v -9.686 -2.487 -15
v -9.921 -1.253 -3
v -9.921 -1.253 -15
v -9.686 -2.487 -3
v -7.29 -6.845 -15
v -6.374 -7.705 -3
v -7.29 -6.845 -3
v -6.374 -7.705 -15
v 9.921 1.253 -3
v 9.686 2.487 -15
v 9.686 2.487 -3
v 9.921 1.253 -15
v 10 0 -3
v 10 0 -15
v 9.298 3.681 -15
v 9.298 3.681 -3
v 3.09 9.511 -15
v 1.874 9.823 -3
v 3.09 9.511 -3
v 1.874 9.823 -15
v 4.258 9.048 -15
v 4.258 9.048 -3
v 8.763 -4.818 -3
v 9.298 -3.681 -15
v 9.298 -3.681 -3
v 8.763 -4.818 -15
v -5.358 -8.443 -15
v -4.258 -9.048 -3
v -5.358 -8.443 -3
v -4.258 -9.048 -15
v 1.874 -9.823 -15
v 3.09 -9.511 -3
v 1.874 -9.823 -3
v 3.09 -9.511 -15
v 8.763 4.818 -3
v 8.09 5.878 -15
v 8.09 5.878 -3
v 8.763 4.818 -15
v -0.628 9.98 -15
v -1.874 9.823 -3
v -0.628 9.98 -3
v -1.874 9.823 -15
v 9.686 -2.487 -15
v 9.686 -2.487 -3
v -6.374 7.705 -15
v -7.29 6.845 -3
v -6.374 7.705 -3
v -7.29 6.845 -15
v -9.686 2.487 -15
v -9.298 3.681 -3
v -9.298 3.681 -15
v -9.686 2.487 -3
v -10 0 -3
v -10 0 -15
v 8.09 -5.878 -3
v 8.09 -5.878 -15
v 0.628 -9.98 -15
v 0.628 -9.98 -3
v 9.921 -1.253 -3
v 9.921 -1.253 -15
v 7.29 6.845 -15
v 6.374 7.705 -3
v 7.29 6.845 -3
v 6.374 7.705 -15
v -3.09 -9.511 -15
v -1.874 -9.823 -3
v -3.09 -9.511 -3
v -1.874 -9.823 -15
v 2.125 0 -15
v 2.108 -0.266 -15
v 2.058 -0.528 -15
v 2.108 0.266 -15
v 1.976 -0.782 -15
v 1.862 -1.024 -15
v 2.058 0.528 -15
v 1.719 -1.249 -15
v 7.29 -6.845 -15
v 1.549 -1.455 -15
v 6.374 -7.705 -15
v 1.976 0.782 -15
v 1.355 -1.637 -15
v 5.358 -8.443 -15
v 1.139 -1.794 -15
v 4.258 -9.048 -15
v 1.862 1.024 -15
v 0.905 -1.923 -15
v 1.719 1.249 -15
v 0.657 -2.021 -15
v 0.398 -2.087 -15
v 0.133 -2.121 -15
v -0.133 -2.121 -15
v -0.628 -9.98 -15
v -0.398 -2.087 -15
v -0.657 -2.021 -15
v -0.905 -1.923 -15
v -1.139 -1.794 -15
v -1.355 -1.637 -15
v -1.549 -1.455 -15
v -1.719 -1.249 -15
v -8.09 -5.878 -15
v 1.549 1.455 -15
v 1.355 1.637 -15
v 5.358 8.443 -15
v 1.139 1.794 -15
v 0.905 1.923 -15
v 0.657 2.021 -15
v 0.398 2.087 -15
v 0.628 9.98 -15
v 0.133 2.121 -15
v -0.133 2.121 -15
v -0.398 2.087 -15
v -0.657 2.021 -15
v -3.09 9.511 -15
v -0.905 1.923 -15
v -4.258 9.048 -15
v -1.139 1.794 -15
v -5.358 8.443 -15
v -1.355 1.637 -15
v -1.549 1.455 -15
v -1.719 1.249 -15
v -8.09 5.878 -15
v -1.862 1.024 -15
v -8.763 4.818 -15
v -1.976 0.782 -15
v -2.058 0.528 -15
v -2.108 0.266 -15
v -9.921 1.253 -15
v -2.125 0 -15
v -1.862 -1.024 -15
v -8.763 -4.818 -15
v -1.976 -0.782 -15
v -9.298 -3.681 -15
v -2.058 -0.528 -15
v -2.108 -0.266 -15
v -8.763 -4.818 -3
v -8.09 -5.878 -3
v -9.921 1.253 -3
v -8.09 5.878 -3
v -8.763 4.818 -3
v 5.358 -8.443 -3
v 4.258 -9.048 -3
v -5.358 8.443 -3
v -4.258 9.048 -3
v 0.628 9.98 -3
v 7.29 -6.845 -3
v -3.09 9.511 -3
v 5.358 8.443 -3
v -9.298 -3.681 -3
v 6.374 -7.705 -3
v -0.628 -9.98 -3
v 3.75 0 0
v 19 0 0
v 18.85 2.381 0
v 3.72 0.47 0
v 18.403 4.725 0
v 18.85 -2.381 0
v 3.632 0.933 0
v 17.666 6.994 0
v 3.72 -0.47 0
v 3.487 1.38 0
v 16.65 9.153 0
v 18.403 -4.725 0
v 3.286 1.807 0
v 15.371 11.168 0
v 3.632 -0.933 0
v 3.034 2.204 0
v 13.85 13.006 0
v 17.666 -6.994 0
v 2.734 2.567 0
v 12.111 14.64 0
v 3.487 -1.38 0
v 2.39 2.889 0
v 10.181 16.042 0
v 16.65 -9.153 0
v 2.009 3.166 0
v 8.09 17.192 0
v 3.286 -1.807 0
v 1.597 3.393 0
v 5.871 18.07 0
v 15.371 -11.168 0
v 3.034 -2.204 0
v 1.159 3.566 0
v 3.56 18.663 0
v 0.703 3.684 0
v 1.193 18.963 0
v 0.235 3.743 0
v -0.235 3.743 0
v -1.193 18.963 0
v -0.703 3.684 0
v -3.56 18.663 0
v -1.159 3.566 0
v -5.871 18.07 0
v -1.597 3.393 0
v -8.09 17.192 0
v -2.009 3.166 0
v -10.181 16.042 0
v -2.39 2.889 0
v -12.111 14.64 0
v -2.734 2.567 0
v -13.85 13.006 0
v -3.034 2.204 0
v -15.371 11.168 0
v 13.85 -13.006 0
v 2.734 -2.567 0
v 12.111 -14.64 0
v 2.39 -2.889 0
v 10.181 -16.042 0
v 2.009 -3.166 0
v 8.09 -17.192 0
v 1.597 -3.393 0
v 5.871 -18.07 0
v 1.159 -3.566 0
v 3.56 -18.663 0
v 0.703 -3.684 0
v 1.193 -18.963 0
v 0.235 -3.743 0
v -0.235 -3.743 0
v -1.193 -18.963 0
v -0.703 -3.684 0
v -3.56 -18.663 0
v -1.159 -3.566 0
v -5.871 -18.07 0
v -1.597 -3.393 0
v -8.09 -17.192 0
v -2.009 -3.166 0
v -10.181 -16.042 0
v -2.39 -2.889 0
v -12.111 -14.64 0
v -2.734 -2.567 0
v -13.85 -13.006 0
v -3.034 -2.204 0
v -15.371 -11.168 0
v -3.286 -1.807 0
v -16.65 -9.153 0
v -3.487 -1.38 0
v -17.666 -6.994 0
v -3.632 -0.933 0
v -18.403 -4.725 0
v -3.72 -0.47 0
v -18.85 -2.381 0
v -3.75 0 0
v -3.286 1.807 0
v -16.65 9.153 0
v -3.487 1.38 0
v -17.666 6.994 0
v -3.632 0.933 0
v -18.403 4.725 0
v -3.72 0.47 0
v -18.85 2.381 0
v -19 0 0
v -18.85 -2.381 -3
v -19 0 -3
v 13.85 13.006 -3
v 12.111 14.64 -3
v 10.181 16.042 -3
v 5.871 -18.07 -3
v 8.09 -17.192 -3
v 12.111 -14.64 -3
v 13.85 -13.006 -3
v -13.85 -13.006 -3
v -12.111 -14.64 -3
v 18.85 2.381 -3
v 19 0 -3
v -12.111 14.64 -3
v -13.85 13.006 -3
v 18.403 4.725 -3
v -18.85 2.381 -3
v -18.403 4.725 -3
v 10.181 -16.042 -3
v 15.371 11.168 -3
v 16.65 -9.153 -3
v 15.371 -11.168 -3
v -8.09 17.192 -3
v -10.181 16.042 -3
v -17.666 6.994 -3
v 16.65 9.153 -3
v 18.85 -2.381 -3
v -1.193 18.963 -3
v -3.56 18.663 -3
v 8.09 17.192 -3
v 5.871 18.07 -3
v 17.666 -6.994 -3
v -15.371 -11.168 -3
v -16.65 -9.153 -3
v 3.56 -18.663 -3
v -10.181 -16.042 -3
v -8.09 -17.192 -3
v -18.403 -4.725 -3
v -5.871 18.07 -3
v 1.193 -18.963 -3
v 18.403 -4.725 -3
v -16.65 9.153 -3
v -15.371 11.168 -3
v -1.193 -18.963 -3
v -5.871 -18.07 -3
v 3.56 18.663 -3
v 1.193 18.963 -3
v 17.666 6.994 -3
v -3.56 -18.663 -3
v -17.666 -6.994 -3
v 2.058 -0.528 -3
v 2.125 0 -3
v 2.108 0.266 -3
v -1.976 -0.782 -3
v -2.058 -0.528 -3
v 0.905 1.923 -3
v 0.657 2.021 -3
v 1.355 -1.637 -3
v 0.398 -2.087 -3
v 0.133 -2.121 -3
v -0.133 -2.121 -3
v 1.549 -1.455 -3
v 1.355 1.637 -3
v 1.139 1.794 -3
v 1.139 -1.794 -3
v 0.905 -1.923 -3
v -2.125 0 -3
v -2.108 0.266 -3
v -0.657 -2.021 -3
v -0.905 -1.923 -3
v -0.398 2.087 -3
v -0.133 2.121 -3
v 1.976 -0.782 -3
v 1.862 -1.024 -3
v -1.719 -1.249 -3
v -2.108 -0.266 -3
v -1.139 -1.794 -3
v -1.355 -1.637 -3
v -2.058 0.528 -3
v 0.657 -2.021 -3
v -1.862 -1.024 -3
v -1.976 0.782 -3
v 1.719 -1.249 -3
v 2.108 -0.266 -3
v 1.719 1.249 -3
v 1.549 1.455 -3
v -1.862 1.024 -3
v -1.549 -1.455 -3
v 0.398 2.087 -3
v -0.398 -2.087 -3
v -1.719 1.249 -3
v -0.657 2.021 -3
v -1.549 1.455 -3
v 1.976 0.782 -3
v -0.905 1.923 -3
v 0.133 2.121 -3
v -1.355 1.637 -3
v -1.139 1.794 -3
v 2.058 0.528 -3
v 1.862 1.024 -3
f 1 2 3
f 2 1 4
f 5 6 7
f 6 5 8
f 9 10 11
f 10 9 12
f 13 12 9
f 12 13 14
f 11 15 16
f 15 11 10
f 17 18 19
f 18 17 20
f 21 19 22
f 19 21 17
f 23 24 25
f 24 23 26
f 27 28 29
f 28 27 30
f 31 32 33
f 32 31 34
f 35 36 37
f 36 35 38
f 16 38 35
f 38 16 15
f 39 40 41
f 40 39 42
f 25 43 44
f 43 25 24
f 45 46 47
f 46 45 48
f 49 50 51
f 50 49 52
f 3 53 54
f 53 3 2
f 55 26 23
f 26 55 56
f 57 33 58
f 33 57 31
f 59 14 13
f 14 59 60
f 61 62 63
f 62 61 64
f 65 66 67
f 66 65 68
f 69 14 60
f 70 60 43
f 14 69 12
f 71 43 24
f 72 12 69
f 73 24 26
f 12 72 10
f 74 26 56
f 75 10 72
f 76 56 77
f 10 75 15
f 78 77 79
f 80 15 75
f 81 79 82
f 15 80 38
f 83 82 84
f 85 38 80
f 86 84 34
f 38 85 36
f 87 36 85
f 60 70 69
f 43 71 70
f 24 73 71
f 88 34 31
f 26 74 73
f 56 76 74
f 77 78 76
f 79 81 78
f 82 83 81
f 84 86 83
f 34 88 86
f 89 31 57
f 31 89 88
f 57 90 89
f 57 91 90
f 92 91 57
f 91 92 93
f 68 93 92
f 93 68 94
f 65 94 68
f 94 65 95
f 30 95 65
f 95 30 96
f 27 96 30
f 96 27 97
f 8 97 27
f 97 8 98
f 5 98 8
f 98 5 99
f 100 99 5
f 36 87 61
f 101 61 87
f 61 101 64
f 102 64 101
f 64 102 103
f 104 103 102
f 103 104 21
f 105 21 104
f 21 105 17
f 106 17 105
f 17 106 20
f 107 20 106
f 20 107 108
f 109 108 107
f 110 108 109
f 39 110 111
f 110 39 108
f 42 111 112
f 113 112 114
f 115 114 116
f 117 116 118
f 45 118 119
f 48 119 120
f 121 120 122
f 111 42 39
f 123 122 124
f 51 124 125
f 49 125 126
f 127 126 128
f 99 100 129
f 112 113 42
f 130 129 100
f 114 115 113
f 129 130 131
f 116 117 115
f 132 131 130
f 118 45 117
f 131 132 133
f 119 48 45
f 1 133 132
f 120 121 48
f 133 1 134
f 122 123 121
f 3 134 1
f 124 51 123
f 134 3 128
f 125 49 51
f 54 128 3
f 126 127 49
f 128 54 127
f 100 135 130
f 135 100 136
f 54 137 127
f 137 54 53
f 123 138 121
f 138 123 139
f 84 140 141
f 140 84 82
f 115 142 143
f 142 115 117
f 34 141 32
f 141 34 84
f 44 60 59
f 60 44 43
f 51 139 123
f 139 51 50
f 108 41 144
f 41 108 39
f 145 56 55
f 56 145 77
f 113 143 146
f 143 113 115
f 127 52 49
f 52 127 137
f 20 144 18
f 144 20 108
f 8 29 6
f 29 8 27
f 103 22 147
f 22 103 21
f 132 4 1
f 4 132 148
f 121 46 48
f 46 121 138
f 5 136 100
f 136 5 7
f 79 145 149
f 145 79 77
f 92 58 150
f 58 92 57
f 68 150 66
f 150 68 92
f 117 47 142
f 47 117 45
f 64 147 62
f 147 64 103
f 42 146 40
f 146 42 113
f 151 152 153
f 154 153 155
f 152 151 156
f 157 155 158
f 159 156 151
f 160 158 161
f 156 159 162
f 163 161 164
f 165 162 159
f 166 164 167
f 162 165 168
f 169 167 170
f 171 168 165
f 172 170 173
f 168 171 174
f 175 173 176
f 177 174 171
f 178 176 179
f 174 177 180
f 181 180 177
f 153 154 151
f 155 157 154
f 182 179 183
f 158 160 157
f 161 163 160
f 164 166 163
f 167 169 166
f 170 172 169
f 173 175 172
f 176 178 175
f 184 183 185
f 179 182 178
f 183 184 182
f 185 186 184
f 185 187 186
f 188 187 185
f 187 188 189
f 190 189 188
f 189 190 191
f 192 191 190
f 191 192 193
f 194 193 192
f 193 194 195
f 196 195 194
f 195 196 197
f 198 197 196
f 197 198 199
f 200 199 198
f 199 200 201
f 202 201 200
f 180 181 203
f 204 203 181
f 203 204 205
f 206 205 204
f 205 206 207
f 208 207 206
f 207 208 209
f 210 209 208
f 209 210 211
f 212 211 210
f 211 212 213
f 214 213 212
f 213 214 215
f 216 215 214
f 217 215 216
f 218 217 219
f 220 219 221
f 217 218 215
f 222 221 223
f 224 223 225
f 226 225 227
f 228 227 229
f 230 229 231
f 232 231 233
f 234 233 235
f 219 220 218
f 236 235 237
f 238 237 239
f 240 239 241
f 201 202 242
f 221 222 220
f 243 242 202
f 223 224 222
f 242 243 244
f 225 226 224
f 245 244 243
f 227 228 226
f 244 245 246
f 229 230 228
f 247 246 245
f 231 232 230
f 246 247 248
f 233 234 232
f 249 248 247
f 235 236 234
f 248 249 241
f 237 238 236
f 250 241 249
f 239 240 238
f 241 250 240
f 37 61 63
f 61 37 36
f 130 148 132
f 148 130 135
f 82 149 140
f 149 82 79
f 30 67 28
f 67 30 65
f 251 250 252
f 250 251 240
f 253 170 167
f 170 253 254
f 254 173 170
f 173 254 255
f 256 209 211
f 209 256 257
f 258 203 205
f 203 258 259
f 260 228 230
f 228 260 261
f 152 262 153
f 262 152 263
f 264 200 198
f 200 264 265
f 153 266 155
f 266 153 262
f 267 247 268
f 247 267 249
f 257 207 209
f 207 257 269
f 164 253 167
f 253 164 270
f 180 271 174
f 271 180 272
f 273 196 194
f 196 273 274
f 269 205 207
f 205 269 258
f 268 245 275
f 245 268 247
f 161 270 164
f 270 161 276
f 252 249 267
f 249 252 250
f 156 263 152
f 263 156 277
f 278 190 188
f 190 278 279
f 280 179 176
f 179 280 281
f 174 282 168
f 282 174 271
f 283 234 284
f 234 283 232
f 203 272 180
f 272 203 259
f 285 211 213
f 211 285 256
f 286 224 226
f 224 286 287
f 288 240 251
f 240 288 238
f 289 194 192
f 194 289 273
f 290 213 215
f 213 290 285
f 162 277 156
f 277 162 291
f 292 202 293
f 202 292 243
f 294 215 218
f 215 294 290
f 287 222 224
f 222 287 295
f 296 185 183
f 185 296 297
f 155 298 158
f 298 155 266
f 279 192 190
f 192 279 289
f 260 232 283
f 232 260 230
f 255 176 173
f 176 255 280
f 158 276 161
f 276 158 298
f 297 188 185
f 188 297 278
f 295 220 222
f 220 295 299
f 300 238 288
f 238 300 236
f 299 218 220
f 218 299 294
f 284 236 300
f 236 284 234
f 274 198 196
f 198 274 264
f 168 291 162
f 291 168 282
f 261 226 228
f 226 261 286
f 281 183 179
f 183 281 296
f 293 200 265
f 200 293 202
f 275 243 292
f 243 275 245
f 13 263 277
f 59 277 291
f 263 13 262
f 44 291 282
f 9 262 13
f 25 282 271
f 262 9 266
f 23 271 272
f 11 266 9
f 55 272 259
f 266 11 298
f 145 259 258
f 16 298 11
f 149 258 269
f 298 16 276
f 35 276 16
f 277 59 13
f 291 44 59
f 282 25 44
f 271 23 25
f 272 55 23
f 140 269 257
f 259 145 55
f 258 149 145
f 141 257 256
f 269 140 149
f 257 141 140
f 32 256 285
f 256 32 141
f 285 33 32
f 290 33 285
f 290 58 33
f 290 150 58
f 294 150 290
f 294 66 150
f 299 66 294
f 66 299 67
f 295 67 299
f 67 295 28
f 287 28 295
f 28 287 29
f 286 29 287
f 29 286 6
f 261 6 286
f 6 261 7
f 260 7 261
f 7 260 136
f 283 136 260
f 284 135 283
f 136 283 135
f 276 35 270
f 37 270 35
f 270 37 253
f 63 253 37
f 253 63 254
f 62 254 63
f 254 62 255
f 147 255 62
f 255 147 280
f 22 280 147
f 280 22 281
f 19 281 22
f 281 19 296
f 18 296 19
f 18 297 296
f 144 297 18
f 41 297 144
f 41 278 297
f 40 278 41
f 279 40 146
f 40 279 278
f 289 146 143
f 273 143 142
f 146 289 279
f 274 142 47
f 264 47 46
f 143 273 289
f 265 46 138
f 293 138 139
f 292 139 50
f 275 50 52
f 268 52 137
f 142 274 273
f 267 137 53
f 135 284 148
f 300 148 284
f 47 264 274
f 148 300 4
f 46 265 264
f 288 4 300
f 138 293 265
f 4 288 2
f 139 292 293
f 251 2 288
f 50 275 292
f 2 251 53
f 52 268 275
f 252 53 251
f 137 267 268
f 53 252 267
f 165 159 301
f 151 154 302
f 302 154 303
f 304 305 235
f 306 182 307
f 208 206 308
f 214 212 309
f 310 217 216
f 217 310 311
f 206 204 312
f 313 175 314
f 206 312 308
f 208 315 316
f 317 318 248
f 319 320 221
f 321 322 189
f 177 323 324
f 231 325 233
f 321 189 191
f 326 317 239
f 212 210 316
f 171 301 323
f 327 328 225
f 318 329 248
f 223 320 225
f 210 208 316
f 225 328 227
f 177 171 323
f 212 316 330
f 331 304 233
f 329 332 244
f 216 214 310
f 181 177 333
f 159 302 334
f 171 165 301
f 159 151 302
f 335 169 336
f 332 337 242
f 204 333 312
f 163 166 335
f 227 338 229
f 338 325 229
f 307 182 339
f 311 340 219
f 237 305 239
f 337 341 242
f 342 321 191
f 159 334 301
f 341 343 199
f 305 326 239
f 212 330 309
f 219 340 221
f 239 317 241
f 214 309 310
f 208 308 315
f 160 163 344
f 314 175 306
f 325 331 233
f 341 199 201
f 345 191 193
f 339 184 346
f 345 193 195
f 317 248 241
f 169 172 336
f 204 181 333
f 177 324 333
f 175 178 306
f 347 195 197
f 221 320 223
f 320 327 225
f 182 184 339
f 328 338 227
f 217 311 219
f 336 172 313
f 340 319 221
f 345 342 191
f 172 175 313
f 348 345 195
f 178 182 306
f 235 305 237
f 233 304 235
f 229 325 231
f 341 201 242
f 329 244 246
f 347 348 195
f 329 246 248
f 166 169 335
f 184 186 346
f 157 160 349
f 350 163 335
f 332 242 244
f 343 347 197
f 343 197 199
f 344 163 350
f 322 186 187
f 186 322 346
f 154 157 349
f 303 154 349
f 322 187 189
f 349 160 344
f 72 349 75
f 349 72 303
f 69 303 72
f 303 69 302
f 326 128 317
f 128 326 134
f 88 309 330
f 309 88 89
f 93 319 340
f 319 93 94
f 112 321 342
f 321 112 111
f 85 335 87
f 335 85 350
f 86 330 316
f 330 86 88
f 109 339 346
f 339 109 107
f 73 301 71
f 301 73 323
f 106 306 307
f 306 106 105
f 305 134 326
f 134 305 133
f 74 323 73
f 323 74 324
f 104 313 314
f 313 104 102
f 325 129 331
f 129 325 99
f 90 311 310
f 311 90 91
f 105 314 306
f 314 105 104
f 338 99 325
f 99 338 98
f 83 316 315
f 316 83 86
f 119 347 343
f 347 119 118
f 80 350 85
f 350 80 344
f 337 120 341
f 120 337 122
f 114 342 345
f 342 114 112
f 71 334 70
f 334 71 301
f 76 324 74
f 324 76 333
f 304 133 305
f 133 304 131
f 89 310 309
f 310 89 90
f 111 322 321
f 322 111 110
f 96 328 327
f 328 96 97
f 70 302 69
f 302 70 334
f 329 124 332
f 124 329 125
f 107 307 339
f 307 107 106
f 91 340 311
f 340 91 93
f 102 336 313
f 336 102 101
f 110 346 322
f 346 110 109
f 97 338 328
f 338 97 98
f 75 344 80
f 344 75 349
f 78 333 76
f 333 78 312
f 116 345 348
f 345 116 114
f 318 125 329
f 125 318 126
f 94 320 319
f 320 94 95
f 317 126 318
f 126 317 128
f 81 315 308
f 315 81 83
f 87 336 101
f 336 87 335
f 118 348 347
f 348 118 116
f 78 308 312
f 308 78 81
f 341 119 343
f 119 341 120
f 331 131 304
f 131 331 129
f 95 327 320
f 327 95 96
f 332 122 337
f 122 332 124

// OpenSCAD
$fn = 50;


difference() {
	union() {
		translate(v = [0, 0, -15.0000000000]) {
			cylinder(h = 15, r = 10.0000000000);
		}
		translate(v = [0, 0, -3.0000000000]) {
			cylinder(h = 3, r = 19.0000000000);
		}
	}
	union() {
		translate(v = [0, 0, 0]) {
			rotate(a = [0, 0, 0]) {
				difference() {
					union() {
						#translate(v = [0, 0, -15.0000000000]) {
							cylinder(h = 15, r = 2.0000000000);
						}
						#translate(v = [0, 0, -3]) {
							cylinder(h = 3, r1 = 2.1250000000, r2 = 3.7500000000);
						}
						#translate(v = [0, 0, -15.0000000000]) {
							cylinder(h = 15, r = 2.1250000000);
						}
						#translate(v = [0, 0, -15.0000000000]) {
							cylinder(h = 15, r = 2.0000000000);
						}
					}
					union();
				}
			}
		}
	}
}
